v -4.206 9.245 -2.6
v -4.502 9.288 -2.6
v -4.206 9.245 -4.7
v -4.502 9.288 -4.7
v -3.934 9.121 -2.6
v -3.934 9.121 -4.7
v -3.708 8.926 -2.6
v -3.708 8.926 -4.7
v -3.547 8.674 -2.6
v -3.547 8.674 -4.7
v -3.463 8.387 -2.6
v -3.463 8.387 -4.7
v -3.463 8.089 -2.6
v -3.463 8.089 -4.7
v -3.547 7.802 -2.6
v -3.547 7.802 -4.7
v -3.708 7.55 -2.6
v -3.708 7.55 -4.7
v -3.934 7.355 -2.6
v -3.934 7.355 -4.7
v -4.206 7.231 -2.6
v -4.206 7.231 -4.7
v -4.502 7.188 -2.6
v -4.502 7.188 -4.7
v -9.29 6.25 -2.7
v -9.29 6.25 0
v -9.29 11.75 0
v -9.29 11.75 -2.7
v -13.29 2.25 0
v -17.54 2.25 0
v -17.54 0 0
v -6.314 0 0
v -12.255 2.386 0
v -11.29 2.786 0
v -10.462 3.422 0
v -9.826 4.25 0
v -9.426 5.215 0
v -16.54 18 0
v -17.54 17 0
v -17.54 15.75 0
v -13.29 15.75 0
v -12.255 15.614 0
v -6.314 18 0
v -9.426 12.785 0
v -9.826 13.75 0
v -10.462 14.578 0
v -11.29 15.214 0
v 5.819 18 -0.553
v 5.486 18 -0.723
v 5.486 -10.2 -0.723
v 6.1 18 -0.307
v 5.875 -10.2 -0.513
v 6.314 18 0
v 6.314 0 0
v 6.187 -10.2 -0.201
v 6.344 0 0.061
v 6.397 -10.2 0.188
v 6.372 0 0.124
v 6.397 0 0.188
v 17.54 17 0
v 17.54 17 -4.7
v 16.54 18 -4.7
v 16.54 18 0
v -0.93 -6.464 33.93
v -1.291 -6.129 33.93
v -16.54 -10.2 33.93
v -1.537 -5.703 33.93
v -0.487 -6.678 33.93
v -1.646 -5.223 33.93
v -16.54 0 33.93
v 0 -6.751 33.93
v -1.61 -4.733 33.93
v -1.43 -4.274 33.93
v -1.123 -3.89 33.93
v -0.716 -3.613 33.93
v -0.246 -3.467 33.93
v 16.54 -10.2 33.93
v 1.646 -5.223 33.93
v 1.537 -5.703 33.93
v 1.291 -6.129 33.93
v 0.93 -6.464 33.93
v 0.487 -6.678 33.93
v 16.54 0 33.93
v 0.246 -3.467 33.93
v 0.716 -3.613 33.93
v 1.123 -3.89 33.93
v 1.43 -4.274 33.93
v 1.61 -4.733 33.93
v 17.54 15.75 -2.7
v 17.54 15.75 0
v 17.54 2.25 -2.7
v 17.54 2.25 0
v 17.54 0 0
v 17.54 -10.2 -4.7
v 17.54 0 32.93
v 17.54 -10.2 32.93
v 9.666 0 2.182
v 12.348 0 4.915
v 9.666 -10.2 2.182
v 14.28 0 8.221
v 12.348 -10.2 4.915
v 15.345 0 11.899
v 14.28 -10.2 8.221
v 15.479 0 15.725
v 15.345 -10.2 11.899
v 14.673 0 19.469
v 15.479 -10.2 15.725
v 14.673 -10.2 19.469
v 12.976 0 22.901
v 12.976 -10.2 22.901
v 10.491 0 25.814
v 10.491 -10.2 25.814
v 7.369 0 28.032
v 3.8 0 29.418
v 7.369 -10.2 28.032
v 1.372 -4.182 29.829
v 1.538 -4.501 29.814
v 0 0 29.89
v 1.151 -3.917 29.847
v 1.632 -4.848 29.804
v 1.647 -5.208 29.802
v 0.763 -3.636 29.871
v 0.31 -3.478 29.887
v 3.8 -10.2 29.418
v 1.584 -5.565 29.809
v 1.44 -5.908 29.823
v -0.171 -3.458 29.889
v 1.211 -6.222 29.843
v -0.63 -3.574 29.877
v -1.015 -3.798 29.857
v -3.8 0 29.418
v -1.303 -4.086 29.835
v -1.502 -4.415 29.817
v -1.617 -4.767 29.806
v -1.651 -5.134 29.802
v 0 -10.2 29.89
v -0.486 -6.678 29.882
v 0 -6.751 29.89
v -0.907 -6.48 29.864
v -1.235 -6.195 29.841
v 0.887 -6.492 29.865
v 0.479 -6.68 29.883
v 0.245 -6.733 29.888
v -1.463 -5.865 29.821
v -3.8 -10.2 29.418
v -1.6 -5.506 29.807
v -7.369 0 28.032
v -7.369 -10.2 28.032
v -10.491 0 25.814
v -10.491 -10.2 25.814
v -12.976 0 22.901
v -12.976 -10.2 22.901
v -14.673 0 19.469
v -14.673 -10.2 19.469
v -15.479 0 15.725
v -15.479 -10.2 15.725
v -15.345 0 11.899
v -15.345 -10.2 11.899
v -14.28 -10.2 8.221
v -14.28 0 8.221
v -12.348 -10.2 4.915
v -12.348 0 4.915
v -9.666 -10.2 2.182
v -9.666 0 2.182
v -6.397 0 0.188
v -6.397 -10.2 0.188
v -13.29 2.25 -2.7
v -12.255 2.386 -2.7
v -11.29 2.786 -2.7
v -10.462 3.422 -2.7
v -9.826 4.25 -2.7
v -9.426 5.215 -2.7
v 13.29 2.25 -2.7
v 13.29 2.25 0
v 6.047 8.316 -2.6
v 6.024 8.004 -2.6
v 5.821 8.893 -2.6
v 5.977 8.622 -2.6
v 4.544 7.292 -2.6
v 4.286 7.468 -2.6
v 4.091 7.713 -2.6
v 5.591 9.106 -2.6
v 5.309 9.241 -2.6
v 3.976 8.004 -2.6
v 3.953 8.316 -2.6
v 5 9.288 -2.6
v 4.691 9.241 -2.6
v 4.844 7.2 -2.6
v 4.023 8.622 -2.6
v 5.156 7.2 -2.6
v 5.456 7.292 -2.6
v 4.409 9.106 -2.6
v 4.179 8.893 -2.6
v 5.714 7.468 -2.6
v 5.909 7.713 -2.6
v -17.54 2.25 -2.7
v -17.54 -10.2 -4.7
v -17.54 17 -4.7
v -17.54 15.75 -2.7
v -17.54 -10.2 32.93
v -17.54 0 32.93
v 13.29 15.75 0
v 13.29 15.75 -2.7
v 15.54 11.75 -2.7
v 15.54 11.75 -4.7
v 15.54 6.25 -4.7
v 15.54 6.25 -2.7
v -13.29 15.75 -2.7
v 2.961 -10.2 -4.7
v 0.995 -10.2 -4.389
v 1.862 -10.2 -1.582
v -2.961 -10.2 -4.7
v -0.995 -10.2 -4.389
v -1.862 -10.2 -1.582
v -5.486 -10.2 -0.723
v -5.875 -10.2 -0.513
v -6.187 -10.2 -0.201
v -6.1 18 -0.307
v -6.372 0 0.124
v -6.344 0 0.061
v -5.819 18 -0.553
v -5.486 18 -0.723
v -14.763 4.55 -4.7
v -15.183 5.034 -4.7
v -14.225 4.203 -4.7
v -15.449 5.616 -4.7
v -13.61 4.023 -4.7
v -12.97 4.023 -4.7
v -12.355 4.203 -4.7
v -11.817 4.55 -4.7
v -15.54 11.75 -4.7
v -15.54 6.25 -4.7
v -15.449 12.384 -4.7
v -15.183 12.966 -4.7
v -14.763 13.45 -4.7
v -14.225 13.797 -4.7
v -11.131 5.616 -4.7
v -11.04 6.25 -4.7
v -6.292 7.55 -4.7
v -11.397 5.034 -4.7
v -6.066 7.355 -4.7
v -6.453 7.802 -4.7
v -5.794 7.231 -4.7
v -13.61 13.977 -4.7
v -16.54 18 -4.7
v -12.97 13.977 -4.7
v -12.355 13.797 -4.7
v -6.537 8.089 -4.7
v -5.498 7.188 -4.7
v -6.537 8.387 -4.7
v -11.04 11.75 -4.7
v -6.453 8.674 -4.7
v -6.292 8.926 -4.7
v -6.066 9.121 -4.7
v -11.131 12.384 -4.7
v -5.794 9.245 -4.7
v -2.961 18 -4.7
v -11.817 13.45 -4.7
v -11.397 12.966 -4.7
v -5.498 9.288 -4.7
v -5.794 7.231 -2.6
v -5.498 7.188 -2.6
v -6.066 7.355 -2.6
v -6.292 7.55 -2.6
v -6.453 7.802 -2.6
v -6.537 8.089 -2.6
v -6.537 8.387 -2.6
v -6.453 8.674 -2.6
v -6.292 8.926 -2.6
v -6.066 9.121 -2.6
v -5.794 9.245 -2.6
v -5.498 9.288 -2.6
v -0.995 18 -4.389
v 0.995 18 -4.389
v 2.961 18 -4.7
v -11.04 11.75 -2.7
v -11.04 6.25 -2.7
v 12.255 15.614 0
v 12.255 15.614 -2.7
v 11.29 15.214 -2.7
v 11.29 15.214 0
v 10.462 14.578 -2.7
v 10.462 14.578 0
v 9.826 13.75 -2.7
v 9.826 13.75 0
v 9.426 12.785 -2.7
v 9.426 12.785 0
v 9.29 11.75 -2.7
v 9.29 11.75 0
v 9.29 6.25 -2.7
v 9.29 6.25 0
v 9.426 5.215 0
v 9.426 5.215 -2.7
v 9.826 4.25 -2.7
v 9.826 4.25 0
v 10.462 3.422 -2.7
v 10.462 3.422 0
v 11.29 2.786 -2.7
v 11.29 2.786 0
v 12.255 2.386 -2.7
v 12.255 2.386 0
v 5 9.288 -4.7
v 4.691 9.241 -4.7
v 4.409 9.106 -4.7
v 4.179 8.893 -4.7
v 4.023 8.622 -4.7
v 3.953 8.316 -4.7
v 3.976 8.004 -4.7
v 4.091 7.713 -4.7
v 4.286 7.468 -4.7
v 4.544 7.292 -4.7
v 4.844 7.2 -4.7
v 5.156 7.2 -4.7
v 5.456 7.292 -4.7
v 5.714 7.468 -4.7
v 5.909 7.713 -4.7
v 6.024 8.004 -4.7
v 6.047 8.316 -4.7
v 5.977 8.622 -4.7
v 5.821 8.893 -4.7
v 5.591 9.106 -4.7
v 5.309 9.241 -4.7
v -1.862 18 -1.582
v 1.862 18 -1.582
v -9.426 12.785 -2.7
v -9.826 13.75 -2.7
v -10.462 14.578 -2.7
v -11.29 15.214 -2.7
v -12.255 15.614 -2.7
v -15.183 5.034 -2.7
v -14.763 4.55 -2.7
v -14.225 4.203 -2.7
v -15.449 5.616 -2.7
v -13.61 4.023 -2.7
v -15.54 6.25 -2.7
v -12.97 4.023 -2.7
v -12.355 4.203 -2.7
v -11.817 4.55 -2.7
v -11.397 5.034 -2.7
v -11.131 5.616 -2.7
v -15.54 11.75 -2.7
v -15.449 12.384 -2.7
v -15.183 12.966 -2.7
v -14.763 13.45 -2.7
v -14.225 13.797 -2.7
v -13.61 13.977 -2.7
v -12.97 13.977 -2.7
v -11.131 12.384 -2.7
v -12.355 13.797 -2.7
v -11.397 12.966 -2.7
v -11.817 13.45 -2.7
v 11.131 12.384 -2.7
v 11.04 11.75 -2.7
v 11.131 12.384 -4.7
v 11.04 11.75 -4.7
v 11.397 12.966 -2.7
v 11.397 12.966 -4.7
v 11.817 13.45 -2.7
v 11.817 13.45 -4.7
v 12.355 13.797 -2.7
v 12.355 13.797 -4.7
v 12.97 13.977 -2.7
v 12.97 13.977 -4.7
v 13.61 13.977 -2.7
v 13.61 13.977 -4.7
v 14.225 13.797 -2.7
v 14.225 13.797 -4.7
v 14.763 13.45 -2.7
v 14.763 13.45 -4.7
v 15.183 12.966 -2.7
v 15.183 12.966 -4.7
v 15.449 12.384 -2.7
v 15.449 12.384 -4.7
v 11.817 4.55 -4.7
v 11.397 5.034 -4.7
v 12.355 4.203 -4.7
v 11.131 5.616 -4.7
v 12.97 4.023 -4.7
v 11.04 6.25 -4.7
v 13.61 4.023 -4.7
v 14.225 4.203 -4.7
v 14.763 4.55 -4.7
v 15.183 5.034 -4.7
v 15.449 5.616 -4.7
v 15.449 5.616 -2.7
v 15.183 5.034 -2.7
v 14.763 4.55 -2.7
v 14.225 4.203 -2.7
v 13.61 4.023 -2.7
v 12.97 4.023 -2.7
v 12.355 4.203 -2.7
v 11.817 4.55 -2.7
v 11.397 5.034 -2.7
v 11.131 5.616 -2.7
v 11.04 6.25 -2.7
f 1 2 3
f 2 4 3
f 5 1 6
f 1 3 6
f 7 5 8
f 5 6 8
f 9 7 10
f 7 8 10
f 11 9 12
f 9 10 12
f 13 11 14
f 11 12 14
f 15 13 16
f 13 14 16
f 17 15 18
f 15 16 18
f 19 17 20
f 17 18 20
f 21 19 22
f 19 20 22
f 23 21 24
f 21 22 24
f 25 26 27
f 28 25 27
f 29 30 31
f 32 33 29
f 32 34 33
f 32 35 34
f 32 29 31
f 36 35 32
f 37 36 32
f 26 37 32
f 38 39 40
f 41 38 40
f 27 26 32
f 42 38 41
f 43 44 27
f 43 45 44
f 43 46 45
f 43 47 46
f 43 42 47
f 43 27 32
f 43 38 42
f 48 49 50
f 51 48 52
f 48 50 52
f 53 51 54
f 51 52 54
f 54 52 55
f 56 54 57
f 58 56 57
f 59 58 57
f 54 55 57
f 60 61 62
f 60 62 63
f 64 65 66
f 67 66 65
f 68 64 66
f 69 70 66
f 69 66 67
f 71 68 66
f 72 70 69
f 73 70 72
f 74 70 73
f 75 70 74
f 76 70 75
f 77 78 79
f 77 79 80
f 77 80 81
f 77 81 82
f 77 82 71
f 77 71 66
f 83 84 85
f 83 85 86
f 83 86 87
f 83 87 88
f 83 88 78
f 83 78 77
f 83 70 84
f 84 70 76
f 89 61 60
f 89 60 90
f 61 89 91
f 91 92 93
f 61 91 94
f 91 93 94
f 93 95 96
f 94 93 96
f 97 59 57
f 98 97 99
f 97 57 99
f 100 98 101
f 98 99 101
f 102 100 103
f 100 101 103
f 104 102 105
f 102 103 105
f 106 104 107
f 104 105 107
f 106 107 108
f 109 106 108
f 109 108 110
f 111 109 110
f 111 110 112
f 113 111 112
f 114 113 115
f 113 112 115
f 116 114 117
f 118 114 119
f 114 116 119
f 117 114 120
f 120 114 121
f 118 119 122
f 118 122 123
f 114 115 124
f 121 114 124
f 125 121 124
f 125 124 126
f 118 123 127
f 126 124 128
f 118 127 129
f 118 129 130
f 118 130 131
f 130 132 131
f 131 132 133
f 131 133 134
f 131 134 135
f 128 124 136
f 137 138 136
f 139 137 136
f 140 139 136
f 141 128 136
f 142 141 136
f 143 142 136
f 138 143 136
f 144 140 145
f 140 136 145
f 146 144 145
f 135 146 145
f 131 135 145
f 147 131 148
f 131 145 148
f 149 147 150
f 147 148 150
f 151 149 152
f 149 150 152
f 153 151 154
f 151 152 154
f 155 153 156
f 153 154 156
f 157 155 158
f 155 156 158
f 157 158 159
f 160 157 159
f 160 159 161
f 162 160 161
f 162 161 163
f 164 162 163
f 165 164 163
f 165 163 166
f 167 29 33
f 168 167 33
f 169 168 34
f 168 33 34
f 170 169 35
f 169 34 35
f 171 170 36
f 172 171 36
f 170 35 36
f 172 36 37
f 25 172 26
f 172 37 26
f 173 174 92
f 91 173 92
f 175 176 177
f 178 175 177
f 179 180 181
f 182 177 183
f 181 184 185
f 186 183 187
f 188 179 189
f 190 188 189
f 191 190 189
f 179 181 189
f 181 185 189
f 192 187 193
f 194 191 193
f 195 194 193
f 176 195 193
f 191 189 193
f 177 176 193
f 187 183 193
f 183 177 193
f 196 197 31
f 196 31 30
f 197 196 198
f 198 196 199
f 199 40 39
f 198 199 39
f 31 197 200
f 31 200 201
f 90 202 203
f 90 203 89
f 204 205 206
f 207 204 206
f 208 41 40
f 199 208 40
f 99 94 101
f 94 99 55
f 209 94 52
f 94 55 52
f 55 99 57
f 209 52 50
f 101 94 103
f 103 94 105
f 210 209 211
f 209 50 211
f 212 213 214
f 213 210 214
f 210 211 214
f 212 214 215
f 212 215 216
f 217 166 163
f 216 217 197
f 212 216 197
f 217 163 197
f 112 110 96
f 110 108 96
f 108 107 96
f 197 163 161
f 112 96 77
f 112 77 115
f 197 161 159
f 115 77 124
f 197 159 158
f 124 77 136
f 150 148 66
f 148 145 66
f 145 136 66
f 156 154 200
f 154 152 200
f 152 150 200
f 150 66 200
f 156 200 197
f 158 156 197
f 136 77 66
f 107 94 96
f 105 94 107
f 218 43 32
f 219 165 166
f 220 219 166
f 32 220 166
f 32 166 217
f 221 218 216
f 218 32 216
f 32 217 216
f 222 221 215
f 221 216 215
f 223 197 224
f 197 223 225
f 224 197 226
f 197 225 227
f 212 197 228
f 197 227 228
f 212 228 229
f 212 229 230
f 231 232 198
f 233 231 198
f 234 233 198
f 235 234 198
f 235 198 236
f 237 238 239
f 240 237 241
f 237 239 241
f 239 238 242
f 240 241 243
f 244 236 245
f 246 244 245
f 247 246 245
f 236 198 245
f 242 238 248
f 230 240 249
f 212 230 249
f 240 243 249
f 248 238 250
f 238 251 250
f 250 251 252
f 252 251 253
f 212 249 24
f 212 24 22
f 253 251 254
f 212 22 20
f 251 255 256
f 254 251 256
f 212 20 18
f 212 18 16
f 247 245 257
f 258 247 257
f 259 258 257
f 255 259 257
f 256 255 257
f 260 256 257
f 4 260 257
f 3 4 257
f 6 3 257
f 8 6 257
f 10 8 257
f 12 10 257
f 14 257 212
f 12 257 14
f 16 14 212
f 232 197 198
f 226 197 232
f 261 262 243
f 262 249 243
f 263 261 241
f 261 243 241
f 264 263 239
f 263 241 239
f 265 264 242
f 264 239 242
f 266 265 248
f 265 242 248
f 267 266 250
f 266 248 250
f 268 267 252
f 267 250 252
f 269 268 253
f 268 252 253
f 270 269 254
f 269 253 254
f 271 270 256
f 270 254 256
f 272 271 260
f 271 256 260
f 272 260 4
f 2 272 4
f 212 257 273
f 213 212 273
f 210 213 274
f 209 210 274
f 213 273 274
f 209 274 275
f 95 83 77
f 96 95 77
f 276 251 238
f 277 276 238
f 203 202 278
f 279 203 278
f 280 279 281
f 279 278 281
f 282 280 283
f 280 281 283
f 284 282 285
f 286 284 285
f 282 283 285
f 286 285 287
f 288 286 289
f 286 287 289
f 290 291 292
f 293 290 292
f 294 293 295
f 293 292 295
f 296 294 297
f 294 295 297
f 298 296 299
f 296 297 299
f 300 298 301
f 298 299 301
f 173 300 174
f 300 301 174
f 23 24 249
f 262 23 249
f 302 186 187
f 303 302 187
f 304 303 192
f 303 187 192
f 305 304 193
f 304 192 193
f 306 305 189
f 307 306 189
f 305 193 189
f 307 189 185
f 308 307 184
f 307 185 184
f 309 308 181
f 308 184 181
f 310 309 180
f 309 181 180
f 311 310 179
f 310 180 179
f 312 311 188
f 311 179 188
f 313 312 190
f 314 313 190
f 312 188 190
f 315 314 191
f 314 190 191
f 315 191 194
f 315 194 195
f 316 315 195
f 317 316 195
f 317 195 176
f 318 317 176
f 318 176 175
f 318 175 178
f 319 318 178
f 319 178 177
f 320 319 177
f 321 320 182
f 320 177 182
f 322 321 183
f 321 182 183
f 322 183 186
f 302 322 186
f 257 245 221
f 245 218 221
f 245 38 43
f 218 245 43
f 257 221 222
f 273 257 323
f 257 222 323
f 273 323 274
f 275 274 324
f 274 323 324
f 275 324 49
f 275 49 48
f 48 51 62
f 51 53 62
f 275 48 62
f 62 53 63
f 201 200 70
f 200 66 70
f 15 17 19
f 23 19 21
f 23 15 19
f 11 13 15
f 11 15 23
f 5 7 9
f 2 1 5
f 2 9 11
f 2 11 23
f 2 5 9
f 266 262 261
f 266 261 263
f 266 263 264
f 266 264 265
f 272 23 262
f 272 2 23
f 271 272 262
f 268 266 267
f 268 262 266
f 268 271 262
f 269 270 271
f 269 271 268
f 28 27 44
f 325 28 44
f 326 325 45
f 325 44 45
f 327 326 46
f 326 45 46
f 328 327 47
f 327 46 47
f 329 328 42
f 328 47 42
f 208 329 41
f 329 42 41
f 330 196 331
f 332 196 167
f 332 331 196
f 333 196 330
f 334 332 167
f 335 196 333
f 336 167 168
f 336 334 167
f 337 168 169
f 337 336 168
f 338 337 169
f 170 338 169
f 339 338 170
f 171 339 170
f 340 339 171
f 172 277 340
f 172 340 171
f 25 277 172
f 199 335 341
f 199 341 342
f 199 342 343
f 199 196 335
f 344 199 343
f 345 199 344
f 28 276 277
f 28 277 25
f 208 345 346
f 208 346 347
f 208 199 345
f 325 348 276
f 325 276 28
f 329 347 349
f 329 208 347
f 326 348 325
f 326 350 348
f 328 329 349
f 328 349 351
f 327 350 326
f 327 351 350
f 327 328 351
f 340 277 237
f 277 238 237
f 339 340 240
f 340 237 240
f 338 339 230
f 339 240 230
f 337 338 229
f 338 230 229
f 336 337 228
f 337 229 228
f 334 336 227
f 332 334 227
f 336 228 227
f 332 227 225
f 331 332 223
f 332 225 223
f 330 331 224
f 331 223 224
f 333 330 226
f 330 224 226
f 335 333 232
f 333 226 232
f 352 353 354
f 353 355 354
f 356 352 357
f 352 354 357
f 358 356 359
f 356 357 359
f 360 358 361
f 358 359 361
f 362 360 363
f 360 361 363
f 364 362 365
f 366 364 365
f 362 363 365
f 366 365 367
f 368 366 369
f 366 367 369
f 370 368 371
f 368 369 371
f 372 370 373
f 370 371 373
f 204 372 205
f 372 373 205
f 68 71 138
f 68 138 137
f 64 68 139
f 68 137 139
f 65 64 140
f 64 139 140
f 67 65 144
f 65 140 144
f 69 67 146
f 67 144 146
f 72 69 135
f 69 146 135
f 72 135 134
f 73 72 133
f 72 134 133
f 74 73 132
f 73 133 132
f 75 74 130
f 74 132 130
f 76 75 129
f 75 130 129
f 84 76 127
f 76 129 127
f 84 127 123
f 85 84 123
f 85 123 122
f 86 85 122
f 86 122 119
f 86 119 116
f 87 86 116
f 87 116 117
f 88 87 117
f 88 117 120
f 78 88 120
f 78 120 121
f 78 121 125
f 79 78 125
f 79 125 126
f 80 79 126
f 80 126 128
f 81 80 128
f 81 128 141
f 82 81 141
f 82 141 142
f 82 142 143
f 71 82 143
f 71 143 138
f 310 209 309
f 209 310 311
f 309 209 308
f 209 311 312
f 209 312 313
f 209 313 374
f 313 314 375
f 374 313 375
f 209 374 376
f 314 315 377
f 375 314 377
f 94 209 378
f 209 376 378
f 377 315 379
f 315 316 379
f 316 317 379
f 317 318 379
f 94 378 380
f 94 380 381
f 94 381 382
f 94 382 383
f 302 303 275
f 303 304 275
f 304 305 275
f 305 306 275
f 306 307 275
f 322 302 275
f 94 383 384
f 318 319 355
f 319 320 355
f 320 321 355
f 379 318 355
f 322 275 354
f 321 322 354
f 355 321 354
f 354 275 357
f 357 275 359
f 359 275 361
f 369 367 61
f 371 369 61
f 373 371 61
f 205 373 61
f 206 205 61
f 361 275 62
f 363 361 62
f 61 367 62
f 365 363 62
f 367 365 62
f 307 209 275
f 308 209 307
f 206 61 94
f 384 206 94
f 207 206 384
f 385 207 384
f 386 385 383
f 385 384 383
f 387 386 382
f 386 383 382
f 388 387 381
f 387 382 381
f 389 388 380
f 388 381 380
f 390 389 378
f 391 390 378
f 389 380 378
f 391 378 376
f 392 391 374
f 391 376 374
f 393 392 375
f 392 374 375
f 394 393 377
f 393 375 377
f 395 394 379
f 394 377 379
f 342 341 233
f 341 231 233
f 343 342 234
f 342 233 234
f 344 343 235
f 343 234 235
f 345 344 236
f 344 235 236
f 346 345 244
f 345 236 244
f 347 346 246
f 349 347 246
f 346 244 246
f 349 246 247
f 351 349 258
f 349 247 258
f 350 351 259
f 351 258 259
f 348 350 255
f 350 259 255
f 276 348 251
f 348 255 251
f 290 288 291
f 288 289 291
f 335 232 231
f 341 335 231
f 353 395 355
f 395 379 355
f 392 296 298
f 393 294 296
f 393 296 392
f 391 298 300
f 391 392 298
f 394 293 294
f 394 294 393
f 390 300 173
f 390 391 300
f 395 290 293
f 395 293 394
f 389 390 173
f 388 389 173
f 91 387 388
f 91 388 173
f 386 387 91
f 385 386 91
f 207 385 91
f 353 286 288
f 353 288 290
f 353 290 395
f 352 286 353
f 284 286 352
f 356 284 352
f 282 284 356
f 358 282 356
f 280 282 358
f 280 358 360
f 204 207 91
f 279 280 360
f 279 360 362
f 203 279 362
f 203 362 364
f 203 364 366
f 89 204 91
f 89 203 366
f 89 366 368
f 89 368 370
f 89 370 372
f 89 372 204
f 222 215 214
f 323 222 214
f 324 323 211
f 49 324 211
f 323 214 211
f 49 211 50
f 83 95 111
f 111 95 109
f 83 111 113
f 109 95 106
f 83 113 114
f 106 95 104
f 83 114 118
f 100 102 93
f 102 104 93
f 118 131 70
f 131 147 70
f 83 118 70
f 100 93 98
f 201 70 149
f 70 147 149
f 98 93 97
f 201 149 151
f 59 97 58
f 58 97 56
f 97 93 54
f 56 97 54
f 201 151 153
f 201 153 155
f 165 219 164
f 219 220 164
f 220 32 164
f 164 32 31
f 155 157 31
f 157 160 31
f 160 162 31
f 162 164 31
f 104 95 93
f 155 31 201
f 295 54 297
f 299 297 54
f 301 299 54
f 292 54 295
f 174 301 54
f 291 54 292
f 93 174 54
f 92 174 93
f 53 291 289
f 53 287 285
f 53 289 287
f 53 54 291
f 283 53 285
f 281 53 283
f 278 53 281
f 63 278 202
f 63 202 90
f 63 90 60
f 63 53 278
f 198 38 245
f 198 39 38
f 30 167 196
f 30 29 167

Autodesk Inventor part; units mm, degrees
ref_plane "YZ Plane" through (0, 0, 0) normal (1, 0, 0) x (0, 1, 0)
ref_plane "XZ Plane" through (0, 0, 0) normal (0, 1, 0) x (-1, 0, 0)
ref_plane "XY Plane" through (0, 0, 0) normal (0, 0, 1) x (1, 0, 0)
sketch "Sketch4" plane through (0, 0, 0) normal (0, 0, 1) x (1, 0, 0)
  line L0 (-17.54, 18) -> (17.54, 18)
  line L1 (17.54, 18) -> (17.54, -10.2)
  line L2 (17.54, -10.2) -> (-17.54, -10.2)
  line L3 (-17.54, -10.2) -> (-17.54, 18)
  point P0 (0, 0)
  dimension "d24" = 28.2
  dimension "WIDTH" = 35.08
  dimension "d26" = 17.54
  dimension "d28" = 10.2
extrude "Extrusion3" add sketch "Sketch4" against normal blind 4.7
sketch "Sketch5" plane through (0, 0, 0) normal (0, 0, 1) x (1, 0, 0)
  line L0 (-17.54, -10.2) -> (17.54, -10.2)
  line L1 (17.54, -10.2) -> (17.54, 0)
  line L2 (17.54, 0) -> (-17.54, 0)
  line L3 (-17.54, 0) -> (-17.54, -10.2)
  line L4 (-17.54, 18) -> (-17.54, -10.2) projected
  line L5 (-17.54, -10.2) -> (17.54, -10.2) projected
  line L6 (17.54, -10.2) -> (17.54, 18) projected
  point P0 (0, 0)
  dimension "d31" = 0
  dimension "d32" = 0
  dimension "d33" = 0
  dimension "d34" = 0
extrude "Extrusion4" add sketch "Sketch5" along normal blind 33.93
sketch "Sketch7" plane through (-17.54, -10.2, -4.7) normal (0, -1, 0) x (1, 0, 0)
  circle A0 centre (17.54, 19.05) radius 15.29
  line L0 (35.08, 0) -> (35.08, 38.63) projected
  line L1 (0, 38.63) -> (35.08, 38.63) projected
  line L2 (35.08, 0) -> (0, 0) projected
  line L3 (0, 38.63) -> (0, 0) projected
  circle A1 centre (17.54, 19.05) radius 15.79
  circle A2 centre (12.6611, 5.6453) radius 1.525
  circle A3 centre (22.4189, 5.6453) radius 1.525
  line L4 (17.54, 19.05) -> (17.54, 6.8001)
  line L5 (12.6611, 5.6453) -> (17.54, 19.05)
  line L6 (22.4189, 5.6453) -> (17.54, 19.05)
  point P0 (22.9405, 4.2123)
  point P1 (21.6565, 4.3246)
  point P2 (13.4235, 4.3246)
  point P3 (12.1395, 4.2123)
  point P4 (23.8519, 5.1236)
  point P5 (11.2281, 5.1236)
  dimension "PILOT_HOLE" = 30.58
  dimension "d201" = 19.05
  dimension "d225" = 17.54
  dimension "d226" = 31.58
  dimension "d227" = 20
  dimension "d228" = 20
  dimension "d229" = 3.05
  dimension "d230" = 3.05
  dimension "d231" = 14.265
  dimension "d232" = 14.265
sketch "Sketch9" plane through (0, 0, -4.7) normal (0, 0, -1) x (-1, 0, 0)
  line L0 (17.54, 18) -> (-17.54, 18) projected
  line L1 (17.54, 0) -> (-17.54, 0) projected
  line L2 (0, 5.488) -> (0, 10.988) construction
  line L3 (2.25, 5.488) -> (2.25, 10.988)
  line L4 (-2.25, 10.988) -> (-2.25, 5.488)
  arc A0 (-2.25, 5.488) -> (2.25, 5.488) centre (0, 5.488) ccw
  arc A1 (2.25, 10.988) -> (-2.25, 10.988) centre (0, 10.988) ccw
  line L5 (5.498, 8.238) -> (4.502, 8.238) construction
  line L6 (5.498, 9.288) -> (4.502, 9.288)
  line L7 (4.502, 7.188) -> (5.498, 7.188)
  arc A2 (5.498, 7.188) -> (5.498, 9.288) centre (5.498, 8.238) ccw
  arc A3 (4.502, 9.288) -> (4.502, 7.188) centre (4.502, 8.238) ccw
  point P0 (0, 0)
  point P1 (-5, 8.238)
  point P2 (0, 8.238)
  point P3 (5, 8.238)
  dimension "d183" = 18
  dimension "d185" = 2.25
  dimension "d186" = 5.5
  dimension "d187" = 0
  dimension "d188" = 8.238
  dimension "d189" = 1.05
  dimension "d190" = 0.996
  dimension "d191" = 0
  dimension "d192" = 5
  dimension "d203" = 0
  dimension "d204" = 5
extrude "Extrusion6" cut sketch "Sketch9" against normal blind 2.1 contours A2 L7 A3 L6
extrude "Extrusion7" cut sketch "Sketch7" against normal up to surface (10.2 mm away) contours A0 A3 L6 L5 A2 | A2 A0 | A0 A2 | A3 A0 | A0 A3 | A2 L5 L6 A3 A0 | A0 A3 A1 A2 picked at (17.54, 3.6354)
hole "Hole3" at (5, 8.238, -4.7) direction (0, 0, 1) diameter 2.1 depth 2.1
chamfer "Chamfer10" distance 1 angle 45 4 edges at (17.54, -5.1, 33.93) (-17.54, -5.1, 33.93) (17.54, 18, -2.35) (-17.54, 18, -2.35)
sketch "Sketch13" plane through (-16.54, 18, 0) normal (0, 1, 0) x (1, 0, 0)
  circle A0 centre (16.54, 17.05) radius 12.7
  line L0 (0, 4.7) -> (33.08, 4.7) projected
  point P0 (16.54, 0)
  dimension "d196" = 0
  dimension "d197" = 25.4
  dimension "d224" = 12.35
extrude "Extrusion11" cut sketch "Sketch13" against normal up to surface (28.2 mm away)
sketch "Sketch14" plane through (0, 0, 33.93) normal (0, 0, 1) x (1, 0, 0)
  line L0 (-17.54, -10.2) -> (17.54, -10.2) projected
  point P0 (0, 0)
  point P1 (0, -5.1)
  point P2 (-16.54, -10.2)
  point P3 (16.54, -10.2)
  dimension "d212" = 0
  dimension "d213" = 5.1
  dimension "d214" = 10.2
hole "Hole4" at (0, -5.1, 33.93) direction (0, 0, -1) diameter 3.302 end up to surface thread size "8-32 UNC" class "2B" standard "ANSI Unified Screw Threads"
sketch "Sketch20" plane through (0, 0, -4.7) normal (0, 0, -1) x (-1, 0, 0)
  line L0 (-17.54, 18) -> (17.54, 18) projected
  line L1 (-17.54, 0) -> (-17.54, 18) projected
  line L2 (-13.29, 6.25) -> (-13.29, 11.75) construction
  line L3 (-11.04, 6.25) -> (-11.04, 11.75)
  line L4 (-15.54, 11.75) -> (-15.54, 6.25)
  arc A0 (-15.54, 6.25) -> (-11.04, 6.25) centre (-13.29, 6.25) ccw
  arc A1 (-11.04, 11.75) -> (-15.54, 11.75) centre (-13.29, 11.75) ccw
  line L5 (5.2784, 0) -> (5.2784, 18) projected
  line L6 (17.54, 18) -> (-17.54, 18) projected
  line L7 (17.54, -10.2) -> (17.54, 18) projected
  line L8 (13.29, 6.25) -> (13.29, 11.75) construction
  line L9 (15.54, 6.25) -> (15.54, 11.75)
  line L10 (11.04, 11.75) -> (11.04, 6.25)
  arc A2 (11.04, 6.25) -> (15.54, 6.25) centre (13.29, 6.25) ccw
  arc A3 (15.54, 11.75) -> (11.04, 11.75) centre (13.29, 11.75) ccw
  circle A4 centre (-5, 8.238) radius 1.05 projected
  point P0 (0, 0)
  point P1 (-13.29, 9)
  point P2 (-5.2784, 18)
  point P3 (17.54, 0)
  point P4 (13.29, 9)
  point P5 (16.54, 18)
  dimension "d251" = 18
  dimension "d252" = 9
  dimension "d253" = 12.2616
  dimension "d254" = 4.25
  dimension "d255" = 4.5
  dimension "d256" = 5.5
  dimension "d257" = 18
  dimension "d258" = 12.2616
  dimension "d259" = 9
  dimension "d261" = 4.5
  dimension "d262" = 5.5
  dimension "d293" = 4.25
extrude "Extrusion15" cut sketch "Sketch20" against normal through all contours A0 L4 A1 L3 | A2 L10 A3 L9
sketch "Sketch21" plane through (0, 0, 0) normal (0, 0, 1) x (1, 0, 0)
  line L0 (17.54, 18) -> (-17.54, 18) projected
  line L1 (17.54, 0) -> (17.54, 18) projected
  line L2 (17.54, 0) -> (-17.54, 0) projected
  line L3 (-5.2784, 0) -> (-5.2784, 18) projected
  line L4 (13.29, 11.75) -> (13.29, 6.25) construction
  line L5 (9.29, 11.75) -> (9.29, 6.25)
  line L6 (17.29, 6.25) -> (17.29, 11.75)
  arc A0 (17.29, 11.75) -> (9.29, 11.75) centre (13.29, 11.75) ccw
  arc A1 (9.29, 6.25) -> (17.29, 6.25) centre (13.29, 6.25) ccw
  line L7 (-13.29, 11.75) -> (-13.29, 6.25) construction
  line L8 (-17.29, 11.75) -> (-17.29, 6.25)
  line L9 (-9.29, 6.25) -> (-9.29, 11.75)
  arc A2 (-9.29, 11.75) -> (-17.29, 11.75) centre (-13.29, 11.75) ccw
  arc A3 (-17.29, 6.25) -> (-9.29, 6.25) centre (-13.29, 6.25) ccw
  line L10 (-17.54, 18) -> (-17.54, 0) projected
  line L11 (-13.29, 2.25) -> (-17.54, 2.25)
  line L12 (-13.29, 15.75) -> (-17.54, 15.75)
  line L13 (-17.54, -10.2) -> (-17.54, 18) projected
  line L14 (13.29, 15.75) -> (17.54, 15.75)
  line L15 (13.29, 2.25) -> (17.54, 2.25)
  point P0 (0, 0)
  point P1 (13.29, 9)
  point P2 (5.2784, 18)
  point P3 (-13.29, 9)
  point P4 (-17.54, 15.75)
  point P5 (-16.54, 18)
  dimension "d265" = 9
  dimension "d266" = 4.25
  dimension "d267" = 9
  dimension "d269" = 8
  dimension "d270" = 5.5
  dimension "d271" = 8
  dimension "d272" = 5.5
  dimension "d295" = 4.25
extrude "Extrusion16" cut sketch "Sketch21" against normal blind 2.7 contours L1 L15 A1 L6 A0 L14 | A0 L6 A1 L5 | L12 A2 L8 A3 L11 L10 | A2 L9 A3 L8
sketch "Sketch26" plane through (-17.54, -10.2, -4.7) normal (0, -1, 0) x (1, 0, 0)
  circle A0 centre (17.54, 19.05) radius 15.54
  line L0 (34.4, 0) -> (34.4, 38.38)
  line L1 (0, 38.38) -> (34.4, 38.38)
  line L2 (34.4, 0) -> (0, 0)
  line L3 (0, 0) -> (0, 38.38)
  circle A1 centre (17.54, 19.05) radius 16.04
  circle A2 centre (12.5756, 5.4104) radius 1.525
  circle A3 centre (22.5044, 5.4104) radius 1.525
  line L4 (17.54, 19.05) -> (17.54, 6.8001)
  line L5 (12.5756, 5.4104) -> (17.54, 19.05)
  line L6 (22.5044, 5.4104) -> (17.54, 19.05)
  point P0 (17.54, 4.7)
  point P1 (22.6005, 4.2123)
  point P2 (21.3165, 4.3246)
  point P3 (13.0835, 4.3246)
  point P4 (11.7995, 4.2123)
  point P5 (23.5119, 5.1236)
  point P6 (10.8881, 5.1236)
  point P7 (11.1429, 4.8878)
  point P8 (12.054, 3.9773)
  point P9 (23.026, 3.9773)
  point P10 (23.9371, 4.8878)
  dimension "d314" = 31.08
  dimension "d315" = 19.05
  dimension "d316" = 17.54
  dimension "d317" = 32.08
  dimension "d318" = 20
  dimension "d319" = 20
  dimension "d320" = 3.05
  dimension "d321" = 3.05
  dimension "d322" = 14.515
  dimension "d323" = 14.515
extrude "Extrusion19" cut sketch "Sketch26" against normal through all contours A0 A3 L6 L5 A2 | A2 A0 | A0 A2 | A3 A0 | A0 A3 | A2 L5 L6 A3 A0 | A0 A3 A1 A2 picked at (17.54, 3.3865)
equation "\"TOLERANCE\" = 0.05"
equation "\"BEAM_HEIGHT\" = 19.05"
equation "\"d309\" = 19.05"
equation "\"d311\" = 0.05"
equation "\"d324\" = 19.05"
equation "\"d326\" = 0.05"
properties part number "ADAPTER_SM1L03-new"
